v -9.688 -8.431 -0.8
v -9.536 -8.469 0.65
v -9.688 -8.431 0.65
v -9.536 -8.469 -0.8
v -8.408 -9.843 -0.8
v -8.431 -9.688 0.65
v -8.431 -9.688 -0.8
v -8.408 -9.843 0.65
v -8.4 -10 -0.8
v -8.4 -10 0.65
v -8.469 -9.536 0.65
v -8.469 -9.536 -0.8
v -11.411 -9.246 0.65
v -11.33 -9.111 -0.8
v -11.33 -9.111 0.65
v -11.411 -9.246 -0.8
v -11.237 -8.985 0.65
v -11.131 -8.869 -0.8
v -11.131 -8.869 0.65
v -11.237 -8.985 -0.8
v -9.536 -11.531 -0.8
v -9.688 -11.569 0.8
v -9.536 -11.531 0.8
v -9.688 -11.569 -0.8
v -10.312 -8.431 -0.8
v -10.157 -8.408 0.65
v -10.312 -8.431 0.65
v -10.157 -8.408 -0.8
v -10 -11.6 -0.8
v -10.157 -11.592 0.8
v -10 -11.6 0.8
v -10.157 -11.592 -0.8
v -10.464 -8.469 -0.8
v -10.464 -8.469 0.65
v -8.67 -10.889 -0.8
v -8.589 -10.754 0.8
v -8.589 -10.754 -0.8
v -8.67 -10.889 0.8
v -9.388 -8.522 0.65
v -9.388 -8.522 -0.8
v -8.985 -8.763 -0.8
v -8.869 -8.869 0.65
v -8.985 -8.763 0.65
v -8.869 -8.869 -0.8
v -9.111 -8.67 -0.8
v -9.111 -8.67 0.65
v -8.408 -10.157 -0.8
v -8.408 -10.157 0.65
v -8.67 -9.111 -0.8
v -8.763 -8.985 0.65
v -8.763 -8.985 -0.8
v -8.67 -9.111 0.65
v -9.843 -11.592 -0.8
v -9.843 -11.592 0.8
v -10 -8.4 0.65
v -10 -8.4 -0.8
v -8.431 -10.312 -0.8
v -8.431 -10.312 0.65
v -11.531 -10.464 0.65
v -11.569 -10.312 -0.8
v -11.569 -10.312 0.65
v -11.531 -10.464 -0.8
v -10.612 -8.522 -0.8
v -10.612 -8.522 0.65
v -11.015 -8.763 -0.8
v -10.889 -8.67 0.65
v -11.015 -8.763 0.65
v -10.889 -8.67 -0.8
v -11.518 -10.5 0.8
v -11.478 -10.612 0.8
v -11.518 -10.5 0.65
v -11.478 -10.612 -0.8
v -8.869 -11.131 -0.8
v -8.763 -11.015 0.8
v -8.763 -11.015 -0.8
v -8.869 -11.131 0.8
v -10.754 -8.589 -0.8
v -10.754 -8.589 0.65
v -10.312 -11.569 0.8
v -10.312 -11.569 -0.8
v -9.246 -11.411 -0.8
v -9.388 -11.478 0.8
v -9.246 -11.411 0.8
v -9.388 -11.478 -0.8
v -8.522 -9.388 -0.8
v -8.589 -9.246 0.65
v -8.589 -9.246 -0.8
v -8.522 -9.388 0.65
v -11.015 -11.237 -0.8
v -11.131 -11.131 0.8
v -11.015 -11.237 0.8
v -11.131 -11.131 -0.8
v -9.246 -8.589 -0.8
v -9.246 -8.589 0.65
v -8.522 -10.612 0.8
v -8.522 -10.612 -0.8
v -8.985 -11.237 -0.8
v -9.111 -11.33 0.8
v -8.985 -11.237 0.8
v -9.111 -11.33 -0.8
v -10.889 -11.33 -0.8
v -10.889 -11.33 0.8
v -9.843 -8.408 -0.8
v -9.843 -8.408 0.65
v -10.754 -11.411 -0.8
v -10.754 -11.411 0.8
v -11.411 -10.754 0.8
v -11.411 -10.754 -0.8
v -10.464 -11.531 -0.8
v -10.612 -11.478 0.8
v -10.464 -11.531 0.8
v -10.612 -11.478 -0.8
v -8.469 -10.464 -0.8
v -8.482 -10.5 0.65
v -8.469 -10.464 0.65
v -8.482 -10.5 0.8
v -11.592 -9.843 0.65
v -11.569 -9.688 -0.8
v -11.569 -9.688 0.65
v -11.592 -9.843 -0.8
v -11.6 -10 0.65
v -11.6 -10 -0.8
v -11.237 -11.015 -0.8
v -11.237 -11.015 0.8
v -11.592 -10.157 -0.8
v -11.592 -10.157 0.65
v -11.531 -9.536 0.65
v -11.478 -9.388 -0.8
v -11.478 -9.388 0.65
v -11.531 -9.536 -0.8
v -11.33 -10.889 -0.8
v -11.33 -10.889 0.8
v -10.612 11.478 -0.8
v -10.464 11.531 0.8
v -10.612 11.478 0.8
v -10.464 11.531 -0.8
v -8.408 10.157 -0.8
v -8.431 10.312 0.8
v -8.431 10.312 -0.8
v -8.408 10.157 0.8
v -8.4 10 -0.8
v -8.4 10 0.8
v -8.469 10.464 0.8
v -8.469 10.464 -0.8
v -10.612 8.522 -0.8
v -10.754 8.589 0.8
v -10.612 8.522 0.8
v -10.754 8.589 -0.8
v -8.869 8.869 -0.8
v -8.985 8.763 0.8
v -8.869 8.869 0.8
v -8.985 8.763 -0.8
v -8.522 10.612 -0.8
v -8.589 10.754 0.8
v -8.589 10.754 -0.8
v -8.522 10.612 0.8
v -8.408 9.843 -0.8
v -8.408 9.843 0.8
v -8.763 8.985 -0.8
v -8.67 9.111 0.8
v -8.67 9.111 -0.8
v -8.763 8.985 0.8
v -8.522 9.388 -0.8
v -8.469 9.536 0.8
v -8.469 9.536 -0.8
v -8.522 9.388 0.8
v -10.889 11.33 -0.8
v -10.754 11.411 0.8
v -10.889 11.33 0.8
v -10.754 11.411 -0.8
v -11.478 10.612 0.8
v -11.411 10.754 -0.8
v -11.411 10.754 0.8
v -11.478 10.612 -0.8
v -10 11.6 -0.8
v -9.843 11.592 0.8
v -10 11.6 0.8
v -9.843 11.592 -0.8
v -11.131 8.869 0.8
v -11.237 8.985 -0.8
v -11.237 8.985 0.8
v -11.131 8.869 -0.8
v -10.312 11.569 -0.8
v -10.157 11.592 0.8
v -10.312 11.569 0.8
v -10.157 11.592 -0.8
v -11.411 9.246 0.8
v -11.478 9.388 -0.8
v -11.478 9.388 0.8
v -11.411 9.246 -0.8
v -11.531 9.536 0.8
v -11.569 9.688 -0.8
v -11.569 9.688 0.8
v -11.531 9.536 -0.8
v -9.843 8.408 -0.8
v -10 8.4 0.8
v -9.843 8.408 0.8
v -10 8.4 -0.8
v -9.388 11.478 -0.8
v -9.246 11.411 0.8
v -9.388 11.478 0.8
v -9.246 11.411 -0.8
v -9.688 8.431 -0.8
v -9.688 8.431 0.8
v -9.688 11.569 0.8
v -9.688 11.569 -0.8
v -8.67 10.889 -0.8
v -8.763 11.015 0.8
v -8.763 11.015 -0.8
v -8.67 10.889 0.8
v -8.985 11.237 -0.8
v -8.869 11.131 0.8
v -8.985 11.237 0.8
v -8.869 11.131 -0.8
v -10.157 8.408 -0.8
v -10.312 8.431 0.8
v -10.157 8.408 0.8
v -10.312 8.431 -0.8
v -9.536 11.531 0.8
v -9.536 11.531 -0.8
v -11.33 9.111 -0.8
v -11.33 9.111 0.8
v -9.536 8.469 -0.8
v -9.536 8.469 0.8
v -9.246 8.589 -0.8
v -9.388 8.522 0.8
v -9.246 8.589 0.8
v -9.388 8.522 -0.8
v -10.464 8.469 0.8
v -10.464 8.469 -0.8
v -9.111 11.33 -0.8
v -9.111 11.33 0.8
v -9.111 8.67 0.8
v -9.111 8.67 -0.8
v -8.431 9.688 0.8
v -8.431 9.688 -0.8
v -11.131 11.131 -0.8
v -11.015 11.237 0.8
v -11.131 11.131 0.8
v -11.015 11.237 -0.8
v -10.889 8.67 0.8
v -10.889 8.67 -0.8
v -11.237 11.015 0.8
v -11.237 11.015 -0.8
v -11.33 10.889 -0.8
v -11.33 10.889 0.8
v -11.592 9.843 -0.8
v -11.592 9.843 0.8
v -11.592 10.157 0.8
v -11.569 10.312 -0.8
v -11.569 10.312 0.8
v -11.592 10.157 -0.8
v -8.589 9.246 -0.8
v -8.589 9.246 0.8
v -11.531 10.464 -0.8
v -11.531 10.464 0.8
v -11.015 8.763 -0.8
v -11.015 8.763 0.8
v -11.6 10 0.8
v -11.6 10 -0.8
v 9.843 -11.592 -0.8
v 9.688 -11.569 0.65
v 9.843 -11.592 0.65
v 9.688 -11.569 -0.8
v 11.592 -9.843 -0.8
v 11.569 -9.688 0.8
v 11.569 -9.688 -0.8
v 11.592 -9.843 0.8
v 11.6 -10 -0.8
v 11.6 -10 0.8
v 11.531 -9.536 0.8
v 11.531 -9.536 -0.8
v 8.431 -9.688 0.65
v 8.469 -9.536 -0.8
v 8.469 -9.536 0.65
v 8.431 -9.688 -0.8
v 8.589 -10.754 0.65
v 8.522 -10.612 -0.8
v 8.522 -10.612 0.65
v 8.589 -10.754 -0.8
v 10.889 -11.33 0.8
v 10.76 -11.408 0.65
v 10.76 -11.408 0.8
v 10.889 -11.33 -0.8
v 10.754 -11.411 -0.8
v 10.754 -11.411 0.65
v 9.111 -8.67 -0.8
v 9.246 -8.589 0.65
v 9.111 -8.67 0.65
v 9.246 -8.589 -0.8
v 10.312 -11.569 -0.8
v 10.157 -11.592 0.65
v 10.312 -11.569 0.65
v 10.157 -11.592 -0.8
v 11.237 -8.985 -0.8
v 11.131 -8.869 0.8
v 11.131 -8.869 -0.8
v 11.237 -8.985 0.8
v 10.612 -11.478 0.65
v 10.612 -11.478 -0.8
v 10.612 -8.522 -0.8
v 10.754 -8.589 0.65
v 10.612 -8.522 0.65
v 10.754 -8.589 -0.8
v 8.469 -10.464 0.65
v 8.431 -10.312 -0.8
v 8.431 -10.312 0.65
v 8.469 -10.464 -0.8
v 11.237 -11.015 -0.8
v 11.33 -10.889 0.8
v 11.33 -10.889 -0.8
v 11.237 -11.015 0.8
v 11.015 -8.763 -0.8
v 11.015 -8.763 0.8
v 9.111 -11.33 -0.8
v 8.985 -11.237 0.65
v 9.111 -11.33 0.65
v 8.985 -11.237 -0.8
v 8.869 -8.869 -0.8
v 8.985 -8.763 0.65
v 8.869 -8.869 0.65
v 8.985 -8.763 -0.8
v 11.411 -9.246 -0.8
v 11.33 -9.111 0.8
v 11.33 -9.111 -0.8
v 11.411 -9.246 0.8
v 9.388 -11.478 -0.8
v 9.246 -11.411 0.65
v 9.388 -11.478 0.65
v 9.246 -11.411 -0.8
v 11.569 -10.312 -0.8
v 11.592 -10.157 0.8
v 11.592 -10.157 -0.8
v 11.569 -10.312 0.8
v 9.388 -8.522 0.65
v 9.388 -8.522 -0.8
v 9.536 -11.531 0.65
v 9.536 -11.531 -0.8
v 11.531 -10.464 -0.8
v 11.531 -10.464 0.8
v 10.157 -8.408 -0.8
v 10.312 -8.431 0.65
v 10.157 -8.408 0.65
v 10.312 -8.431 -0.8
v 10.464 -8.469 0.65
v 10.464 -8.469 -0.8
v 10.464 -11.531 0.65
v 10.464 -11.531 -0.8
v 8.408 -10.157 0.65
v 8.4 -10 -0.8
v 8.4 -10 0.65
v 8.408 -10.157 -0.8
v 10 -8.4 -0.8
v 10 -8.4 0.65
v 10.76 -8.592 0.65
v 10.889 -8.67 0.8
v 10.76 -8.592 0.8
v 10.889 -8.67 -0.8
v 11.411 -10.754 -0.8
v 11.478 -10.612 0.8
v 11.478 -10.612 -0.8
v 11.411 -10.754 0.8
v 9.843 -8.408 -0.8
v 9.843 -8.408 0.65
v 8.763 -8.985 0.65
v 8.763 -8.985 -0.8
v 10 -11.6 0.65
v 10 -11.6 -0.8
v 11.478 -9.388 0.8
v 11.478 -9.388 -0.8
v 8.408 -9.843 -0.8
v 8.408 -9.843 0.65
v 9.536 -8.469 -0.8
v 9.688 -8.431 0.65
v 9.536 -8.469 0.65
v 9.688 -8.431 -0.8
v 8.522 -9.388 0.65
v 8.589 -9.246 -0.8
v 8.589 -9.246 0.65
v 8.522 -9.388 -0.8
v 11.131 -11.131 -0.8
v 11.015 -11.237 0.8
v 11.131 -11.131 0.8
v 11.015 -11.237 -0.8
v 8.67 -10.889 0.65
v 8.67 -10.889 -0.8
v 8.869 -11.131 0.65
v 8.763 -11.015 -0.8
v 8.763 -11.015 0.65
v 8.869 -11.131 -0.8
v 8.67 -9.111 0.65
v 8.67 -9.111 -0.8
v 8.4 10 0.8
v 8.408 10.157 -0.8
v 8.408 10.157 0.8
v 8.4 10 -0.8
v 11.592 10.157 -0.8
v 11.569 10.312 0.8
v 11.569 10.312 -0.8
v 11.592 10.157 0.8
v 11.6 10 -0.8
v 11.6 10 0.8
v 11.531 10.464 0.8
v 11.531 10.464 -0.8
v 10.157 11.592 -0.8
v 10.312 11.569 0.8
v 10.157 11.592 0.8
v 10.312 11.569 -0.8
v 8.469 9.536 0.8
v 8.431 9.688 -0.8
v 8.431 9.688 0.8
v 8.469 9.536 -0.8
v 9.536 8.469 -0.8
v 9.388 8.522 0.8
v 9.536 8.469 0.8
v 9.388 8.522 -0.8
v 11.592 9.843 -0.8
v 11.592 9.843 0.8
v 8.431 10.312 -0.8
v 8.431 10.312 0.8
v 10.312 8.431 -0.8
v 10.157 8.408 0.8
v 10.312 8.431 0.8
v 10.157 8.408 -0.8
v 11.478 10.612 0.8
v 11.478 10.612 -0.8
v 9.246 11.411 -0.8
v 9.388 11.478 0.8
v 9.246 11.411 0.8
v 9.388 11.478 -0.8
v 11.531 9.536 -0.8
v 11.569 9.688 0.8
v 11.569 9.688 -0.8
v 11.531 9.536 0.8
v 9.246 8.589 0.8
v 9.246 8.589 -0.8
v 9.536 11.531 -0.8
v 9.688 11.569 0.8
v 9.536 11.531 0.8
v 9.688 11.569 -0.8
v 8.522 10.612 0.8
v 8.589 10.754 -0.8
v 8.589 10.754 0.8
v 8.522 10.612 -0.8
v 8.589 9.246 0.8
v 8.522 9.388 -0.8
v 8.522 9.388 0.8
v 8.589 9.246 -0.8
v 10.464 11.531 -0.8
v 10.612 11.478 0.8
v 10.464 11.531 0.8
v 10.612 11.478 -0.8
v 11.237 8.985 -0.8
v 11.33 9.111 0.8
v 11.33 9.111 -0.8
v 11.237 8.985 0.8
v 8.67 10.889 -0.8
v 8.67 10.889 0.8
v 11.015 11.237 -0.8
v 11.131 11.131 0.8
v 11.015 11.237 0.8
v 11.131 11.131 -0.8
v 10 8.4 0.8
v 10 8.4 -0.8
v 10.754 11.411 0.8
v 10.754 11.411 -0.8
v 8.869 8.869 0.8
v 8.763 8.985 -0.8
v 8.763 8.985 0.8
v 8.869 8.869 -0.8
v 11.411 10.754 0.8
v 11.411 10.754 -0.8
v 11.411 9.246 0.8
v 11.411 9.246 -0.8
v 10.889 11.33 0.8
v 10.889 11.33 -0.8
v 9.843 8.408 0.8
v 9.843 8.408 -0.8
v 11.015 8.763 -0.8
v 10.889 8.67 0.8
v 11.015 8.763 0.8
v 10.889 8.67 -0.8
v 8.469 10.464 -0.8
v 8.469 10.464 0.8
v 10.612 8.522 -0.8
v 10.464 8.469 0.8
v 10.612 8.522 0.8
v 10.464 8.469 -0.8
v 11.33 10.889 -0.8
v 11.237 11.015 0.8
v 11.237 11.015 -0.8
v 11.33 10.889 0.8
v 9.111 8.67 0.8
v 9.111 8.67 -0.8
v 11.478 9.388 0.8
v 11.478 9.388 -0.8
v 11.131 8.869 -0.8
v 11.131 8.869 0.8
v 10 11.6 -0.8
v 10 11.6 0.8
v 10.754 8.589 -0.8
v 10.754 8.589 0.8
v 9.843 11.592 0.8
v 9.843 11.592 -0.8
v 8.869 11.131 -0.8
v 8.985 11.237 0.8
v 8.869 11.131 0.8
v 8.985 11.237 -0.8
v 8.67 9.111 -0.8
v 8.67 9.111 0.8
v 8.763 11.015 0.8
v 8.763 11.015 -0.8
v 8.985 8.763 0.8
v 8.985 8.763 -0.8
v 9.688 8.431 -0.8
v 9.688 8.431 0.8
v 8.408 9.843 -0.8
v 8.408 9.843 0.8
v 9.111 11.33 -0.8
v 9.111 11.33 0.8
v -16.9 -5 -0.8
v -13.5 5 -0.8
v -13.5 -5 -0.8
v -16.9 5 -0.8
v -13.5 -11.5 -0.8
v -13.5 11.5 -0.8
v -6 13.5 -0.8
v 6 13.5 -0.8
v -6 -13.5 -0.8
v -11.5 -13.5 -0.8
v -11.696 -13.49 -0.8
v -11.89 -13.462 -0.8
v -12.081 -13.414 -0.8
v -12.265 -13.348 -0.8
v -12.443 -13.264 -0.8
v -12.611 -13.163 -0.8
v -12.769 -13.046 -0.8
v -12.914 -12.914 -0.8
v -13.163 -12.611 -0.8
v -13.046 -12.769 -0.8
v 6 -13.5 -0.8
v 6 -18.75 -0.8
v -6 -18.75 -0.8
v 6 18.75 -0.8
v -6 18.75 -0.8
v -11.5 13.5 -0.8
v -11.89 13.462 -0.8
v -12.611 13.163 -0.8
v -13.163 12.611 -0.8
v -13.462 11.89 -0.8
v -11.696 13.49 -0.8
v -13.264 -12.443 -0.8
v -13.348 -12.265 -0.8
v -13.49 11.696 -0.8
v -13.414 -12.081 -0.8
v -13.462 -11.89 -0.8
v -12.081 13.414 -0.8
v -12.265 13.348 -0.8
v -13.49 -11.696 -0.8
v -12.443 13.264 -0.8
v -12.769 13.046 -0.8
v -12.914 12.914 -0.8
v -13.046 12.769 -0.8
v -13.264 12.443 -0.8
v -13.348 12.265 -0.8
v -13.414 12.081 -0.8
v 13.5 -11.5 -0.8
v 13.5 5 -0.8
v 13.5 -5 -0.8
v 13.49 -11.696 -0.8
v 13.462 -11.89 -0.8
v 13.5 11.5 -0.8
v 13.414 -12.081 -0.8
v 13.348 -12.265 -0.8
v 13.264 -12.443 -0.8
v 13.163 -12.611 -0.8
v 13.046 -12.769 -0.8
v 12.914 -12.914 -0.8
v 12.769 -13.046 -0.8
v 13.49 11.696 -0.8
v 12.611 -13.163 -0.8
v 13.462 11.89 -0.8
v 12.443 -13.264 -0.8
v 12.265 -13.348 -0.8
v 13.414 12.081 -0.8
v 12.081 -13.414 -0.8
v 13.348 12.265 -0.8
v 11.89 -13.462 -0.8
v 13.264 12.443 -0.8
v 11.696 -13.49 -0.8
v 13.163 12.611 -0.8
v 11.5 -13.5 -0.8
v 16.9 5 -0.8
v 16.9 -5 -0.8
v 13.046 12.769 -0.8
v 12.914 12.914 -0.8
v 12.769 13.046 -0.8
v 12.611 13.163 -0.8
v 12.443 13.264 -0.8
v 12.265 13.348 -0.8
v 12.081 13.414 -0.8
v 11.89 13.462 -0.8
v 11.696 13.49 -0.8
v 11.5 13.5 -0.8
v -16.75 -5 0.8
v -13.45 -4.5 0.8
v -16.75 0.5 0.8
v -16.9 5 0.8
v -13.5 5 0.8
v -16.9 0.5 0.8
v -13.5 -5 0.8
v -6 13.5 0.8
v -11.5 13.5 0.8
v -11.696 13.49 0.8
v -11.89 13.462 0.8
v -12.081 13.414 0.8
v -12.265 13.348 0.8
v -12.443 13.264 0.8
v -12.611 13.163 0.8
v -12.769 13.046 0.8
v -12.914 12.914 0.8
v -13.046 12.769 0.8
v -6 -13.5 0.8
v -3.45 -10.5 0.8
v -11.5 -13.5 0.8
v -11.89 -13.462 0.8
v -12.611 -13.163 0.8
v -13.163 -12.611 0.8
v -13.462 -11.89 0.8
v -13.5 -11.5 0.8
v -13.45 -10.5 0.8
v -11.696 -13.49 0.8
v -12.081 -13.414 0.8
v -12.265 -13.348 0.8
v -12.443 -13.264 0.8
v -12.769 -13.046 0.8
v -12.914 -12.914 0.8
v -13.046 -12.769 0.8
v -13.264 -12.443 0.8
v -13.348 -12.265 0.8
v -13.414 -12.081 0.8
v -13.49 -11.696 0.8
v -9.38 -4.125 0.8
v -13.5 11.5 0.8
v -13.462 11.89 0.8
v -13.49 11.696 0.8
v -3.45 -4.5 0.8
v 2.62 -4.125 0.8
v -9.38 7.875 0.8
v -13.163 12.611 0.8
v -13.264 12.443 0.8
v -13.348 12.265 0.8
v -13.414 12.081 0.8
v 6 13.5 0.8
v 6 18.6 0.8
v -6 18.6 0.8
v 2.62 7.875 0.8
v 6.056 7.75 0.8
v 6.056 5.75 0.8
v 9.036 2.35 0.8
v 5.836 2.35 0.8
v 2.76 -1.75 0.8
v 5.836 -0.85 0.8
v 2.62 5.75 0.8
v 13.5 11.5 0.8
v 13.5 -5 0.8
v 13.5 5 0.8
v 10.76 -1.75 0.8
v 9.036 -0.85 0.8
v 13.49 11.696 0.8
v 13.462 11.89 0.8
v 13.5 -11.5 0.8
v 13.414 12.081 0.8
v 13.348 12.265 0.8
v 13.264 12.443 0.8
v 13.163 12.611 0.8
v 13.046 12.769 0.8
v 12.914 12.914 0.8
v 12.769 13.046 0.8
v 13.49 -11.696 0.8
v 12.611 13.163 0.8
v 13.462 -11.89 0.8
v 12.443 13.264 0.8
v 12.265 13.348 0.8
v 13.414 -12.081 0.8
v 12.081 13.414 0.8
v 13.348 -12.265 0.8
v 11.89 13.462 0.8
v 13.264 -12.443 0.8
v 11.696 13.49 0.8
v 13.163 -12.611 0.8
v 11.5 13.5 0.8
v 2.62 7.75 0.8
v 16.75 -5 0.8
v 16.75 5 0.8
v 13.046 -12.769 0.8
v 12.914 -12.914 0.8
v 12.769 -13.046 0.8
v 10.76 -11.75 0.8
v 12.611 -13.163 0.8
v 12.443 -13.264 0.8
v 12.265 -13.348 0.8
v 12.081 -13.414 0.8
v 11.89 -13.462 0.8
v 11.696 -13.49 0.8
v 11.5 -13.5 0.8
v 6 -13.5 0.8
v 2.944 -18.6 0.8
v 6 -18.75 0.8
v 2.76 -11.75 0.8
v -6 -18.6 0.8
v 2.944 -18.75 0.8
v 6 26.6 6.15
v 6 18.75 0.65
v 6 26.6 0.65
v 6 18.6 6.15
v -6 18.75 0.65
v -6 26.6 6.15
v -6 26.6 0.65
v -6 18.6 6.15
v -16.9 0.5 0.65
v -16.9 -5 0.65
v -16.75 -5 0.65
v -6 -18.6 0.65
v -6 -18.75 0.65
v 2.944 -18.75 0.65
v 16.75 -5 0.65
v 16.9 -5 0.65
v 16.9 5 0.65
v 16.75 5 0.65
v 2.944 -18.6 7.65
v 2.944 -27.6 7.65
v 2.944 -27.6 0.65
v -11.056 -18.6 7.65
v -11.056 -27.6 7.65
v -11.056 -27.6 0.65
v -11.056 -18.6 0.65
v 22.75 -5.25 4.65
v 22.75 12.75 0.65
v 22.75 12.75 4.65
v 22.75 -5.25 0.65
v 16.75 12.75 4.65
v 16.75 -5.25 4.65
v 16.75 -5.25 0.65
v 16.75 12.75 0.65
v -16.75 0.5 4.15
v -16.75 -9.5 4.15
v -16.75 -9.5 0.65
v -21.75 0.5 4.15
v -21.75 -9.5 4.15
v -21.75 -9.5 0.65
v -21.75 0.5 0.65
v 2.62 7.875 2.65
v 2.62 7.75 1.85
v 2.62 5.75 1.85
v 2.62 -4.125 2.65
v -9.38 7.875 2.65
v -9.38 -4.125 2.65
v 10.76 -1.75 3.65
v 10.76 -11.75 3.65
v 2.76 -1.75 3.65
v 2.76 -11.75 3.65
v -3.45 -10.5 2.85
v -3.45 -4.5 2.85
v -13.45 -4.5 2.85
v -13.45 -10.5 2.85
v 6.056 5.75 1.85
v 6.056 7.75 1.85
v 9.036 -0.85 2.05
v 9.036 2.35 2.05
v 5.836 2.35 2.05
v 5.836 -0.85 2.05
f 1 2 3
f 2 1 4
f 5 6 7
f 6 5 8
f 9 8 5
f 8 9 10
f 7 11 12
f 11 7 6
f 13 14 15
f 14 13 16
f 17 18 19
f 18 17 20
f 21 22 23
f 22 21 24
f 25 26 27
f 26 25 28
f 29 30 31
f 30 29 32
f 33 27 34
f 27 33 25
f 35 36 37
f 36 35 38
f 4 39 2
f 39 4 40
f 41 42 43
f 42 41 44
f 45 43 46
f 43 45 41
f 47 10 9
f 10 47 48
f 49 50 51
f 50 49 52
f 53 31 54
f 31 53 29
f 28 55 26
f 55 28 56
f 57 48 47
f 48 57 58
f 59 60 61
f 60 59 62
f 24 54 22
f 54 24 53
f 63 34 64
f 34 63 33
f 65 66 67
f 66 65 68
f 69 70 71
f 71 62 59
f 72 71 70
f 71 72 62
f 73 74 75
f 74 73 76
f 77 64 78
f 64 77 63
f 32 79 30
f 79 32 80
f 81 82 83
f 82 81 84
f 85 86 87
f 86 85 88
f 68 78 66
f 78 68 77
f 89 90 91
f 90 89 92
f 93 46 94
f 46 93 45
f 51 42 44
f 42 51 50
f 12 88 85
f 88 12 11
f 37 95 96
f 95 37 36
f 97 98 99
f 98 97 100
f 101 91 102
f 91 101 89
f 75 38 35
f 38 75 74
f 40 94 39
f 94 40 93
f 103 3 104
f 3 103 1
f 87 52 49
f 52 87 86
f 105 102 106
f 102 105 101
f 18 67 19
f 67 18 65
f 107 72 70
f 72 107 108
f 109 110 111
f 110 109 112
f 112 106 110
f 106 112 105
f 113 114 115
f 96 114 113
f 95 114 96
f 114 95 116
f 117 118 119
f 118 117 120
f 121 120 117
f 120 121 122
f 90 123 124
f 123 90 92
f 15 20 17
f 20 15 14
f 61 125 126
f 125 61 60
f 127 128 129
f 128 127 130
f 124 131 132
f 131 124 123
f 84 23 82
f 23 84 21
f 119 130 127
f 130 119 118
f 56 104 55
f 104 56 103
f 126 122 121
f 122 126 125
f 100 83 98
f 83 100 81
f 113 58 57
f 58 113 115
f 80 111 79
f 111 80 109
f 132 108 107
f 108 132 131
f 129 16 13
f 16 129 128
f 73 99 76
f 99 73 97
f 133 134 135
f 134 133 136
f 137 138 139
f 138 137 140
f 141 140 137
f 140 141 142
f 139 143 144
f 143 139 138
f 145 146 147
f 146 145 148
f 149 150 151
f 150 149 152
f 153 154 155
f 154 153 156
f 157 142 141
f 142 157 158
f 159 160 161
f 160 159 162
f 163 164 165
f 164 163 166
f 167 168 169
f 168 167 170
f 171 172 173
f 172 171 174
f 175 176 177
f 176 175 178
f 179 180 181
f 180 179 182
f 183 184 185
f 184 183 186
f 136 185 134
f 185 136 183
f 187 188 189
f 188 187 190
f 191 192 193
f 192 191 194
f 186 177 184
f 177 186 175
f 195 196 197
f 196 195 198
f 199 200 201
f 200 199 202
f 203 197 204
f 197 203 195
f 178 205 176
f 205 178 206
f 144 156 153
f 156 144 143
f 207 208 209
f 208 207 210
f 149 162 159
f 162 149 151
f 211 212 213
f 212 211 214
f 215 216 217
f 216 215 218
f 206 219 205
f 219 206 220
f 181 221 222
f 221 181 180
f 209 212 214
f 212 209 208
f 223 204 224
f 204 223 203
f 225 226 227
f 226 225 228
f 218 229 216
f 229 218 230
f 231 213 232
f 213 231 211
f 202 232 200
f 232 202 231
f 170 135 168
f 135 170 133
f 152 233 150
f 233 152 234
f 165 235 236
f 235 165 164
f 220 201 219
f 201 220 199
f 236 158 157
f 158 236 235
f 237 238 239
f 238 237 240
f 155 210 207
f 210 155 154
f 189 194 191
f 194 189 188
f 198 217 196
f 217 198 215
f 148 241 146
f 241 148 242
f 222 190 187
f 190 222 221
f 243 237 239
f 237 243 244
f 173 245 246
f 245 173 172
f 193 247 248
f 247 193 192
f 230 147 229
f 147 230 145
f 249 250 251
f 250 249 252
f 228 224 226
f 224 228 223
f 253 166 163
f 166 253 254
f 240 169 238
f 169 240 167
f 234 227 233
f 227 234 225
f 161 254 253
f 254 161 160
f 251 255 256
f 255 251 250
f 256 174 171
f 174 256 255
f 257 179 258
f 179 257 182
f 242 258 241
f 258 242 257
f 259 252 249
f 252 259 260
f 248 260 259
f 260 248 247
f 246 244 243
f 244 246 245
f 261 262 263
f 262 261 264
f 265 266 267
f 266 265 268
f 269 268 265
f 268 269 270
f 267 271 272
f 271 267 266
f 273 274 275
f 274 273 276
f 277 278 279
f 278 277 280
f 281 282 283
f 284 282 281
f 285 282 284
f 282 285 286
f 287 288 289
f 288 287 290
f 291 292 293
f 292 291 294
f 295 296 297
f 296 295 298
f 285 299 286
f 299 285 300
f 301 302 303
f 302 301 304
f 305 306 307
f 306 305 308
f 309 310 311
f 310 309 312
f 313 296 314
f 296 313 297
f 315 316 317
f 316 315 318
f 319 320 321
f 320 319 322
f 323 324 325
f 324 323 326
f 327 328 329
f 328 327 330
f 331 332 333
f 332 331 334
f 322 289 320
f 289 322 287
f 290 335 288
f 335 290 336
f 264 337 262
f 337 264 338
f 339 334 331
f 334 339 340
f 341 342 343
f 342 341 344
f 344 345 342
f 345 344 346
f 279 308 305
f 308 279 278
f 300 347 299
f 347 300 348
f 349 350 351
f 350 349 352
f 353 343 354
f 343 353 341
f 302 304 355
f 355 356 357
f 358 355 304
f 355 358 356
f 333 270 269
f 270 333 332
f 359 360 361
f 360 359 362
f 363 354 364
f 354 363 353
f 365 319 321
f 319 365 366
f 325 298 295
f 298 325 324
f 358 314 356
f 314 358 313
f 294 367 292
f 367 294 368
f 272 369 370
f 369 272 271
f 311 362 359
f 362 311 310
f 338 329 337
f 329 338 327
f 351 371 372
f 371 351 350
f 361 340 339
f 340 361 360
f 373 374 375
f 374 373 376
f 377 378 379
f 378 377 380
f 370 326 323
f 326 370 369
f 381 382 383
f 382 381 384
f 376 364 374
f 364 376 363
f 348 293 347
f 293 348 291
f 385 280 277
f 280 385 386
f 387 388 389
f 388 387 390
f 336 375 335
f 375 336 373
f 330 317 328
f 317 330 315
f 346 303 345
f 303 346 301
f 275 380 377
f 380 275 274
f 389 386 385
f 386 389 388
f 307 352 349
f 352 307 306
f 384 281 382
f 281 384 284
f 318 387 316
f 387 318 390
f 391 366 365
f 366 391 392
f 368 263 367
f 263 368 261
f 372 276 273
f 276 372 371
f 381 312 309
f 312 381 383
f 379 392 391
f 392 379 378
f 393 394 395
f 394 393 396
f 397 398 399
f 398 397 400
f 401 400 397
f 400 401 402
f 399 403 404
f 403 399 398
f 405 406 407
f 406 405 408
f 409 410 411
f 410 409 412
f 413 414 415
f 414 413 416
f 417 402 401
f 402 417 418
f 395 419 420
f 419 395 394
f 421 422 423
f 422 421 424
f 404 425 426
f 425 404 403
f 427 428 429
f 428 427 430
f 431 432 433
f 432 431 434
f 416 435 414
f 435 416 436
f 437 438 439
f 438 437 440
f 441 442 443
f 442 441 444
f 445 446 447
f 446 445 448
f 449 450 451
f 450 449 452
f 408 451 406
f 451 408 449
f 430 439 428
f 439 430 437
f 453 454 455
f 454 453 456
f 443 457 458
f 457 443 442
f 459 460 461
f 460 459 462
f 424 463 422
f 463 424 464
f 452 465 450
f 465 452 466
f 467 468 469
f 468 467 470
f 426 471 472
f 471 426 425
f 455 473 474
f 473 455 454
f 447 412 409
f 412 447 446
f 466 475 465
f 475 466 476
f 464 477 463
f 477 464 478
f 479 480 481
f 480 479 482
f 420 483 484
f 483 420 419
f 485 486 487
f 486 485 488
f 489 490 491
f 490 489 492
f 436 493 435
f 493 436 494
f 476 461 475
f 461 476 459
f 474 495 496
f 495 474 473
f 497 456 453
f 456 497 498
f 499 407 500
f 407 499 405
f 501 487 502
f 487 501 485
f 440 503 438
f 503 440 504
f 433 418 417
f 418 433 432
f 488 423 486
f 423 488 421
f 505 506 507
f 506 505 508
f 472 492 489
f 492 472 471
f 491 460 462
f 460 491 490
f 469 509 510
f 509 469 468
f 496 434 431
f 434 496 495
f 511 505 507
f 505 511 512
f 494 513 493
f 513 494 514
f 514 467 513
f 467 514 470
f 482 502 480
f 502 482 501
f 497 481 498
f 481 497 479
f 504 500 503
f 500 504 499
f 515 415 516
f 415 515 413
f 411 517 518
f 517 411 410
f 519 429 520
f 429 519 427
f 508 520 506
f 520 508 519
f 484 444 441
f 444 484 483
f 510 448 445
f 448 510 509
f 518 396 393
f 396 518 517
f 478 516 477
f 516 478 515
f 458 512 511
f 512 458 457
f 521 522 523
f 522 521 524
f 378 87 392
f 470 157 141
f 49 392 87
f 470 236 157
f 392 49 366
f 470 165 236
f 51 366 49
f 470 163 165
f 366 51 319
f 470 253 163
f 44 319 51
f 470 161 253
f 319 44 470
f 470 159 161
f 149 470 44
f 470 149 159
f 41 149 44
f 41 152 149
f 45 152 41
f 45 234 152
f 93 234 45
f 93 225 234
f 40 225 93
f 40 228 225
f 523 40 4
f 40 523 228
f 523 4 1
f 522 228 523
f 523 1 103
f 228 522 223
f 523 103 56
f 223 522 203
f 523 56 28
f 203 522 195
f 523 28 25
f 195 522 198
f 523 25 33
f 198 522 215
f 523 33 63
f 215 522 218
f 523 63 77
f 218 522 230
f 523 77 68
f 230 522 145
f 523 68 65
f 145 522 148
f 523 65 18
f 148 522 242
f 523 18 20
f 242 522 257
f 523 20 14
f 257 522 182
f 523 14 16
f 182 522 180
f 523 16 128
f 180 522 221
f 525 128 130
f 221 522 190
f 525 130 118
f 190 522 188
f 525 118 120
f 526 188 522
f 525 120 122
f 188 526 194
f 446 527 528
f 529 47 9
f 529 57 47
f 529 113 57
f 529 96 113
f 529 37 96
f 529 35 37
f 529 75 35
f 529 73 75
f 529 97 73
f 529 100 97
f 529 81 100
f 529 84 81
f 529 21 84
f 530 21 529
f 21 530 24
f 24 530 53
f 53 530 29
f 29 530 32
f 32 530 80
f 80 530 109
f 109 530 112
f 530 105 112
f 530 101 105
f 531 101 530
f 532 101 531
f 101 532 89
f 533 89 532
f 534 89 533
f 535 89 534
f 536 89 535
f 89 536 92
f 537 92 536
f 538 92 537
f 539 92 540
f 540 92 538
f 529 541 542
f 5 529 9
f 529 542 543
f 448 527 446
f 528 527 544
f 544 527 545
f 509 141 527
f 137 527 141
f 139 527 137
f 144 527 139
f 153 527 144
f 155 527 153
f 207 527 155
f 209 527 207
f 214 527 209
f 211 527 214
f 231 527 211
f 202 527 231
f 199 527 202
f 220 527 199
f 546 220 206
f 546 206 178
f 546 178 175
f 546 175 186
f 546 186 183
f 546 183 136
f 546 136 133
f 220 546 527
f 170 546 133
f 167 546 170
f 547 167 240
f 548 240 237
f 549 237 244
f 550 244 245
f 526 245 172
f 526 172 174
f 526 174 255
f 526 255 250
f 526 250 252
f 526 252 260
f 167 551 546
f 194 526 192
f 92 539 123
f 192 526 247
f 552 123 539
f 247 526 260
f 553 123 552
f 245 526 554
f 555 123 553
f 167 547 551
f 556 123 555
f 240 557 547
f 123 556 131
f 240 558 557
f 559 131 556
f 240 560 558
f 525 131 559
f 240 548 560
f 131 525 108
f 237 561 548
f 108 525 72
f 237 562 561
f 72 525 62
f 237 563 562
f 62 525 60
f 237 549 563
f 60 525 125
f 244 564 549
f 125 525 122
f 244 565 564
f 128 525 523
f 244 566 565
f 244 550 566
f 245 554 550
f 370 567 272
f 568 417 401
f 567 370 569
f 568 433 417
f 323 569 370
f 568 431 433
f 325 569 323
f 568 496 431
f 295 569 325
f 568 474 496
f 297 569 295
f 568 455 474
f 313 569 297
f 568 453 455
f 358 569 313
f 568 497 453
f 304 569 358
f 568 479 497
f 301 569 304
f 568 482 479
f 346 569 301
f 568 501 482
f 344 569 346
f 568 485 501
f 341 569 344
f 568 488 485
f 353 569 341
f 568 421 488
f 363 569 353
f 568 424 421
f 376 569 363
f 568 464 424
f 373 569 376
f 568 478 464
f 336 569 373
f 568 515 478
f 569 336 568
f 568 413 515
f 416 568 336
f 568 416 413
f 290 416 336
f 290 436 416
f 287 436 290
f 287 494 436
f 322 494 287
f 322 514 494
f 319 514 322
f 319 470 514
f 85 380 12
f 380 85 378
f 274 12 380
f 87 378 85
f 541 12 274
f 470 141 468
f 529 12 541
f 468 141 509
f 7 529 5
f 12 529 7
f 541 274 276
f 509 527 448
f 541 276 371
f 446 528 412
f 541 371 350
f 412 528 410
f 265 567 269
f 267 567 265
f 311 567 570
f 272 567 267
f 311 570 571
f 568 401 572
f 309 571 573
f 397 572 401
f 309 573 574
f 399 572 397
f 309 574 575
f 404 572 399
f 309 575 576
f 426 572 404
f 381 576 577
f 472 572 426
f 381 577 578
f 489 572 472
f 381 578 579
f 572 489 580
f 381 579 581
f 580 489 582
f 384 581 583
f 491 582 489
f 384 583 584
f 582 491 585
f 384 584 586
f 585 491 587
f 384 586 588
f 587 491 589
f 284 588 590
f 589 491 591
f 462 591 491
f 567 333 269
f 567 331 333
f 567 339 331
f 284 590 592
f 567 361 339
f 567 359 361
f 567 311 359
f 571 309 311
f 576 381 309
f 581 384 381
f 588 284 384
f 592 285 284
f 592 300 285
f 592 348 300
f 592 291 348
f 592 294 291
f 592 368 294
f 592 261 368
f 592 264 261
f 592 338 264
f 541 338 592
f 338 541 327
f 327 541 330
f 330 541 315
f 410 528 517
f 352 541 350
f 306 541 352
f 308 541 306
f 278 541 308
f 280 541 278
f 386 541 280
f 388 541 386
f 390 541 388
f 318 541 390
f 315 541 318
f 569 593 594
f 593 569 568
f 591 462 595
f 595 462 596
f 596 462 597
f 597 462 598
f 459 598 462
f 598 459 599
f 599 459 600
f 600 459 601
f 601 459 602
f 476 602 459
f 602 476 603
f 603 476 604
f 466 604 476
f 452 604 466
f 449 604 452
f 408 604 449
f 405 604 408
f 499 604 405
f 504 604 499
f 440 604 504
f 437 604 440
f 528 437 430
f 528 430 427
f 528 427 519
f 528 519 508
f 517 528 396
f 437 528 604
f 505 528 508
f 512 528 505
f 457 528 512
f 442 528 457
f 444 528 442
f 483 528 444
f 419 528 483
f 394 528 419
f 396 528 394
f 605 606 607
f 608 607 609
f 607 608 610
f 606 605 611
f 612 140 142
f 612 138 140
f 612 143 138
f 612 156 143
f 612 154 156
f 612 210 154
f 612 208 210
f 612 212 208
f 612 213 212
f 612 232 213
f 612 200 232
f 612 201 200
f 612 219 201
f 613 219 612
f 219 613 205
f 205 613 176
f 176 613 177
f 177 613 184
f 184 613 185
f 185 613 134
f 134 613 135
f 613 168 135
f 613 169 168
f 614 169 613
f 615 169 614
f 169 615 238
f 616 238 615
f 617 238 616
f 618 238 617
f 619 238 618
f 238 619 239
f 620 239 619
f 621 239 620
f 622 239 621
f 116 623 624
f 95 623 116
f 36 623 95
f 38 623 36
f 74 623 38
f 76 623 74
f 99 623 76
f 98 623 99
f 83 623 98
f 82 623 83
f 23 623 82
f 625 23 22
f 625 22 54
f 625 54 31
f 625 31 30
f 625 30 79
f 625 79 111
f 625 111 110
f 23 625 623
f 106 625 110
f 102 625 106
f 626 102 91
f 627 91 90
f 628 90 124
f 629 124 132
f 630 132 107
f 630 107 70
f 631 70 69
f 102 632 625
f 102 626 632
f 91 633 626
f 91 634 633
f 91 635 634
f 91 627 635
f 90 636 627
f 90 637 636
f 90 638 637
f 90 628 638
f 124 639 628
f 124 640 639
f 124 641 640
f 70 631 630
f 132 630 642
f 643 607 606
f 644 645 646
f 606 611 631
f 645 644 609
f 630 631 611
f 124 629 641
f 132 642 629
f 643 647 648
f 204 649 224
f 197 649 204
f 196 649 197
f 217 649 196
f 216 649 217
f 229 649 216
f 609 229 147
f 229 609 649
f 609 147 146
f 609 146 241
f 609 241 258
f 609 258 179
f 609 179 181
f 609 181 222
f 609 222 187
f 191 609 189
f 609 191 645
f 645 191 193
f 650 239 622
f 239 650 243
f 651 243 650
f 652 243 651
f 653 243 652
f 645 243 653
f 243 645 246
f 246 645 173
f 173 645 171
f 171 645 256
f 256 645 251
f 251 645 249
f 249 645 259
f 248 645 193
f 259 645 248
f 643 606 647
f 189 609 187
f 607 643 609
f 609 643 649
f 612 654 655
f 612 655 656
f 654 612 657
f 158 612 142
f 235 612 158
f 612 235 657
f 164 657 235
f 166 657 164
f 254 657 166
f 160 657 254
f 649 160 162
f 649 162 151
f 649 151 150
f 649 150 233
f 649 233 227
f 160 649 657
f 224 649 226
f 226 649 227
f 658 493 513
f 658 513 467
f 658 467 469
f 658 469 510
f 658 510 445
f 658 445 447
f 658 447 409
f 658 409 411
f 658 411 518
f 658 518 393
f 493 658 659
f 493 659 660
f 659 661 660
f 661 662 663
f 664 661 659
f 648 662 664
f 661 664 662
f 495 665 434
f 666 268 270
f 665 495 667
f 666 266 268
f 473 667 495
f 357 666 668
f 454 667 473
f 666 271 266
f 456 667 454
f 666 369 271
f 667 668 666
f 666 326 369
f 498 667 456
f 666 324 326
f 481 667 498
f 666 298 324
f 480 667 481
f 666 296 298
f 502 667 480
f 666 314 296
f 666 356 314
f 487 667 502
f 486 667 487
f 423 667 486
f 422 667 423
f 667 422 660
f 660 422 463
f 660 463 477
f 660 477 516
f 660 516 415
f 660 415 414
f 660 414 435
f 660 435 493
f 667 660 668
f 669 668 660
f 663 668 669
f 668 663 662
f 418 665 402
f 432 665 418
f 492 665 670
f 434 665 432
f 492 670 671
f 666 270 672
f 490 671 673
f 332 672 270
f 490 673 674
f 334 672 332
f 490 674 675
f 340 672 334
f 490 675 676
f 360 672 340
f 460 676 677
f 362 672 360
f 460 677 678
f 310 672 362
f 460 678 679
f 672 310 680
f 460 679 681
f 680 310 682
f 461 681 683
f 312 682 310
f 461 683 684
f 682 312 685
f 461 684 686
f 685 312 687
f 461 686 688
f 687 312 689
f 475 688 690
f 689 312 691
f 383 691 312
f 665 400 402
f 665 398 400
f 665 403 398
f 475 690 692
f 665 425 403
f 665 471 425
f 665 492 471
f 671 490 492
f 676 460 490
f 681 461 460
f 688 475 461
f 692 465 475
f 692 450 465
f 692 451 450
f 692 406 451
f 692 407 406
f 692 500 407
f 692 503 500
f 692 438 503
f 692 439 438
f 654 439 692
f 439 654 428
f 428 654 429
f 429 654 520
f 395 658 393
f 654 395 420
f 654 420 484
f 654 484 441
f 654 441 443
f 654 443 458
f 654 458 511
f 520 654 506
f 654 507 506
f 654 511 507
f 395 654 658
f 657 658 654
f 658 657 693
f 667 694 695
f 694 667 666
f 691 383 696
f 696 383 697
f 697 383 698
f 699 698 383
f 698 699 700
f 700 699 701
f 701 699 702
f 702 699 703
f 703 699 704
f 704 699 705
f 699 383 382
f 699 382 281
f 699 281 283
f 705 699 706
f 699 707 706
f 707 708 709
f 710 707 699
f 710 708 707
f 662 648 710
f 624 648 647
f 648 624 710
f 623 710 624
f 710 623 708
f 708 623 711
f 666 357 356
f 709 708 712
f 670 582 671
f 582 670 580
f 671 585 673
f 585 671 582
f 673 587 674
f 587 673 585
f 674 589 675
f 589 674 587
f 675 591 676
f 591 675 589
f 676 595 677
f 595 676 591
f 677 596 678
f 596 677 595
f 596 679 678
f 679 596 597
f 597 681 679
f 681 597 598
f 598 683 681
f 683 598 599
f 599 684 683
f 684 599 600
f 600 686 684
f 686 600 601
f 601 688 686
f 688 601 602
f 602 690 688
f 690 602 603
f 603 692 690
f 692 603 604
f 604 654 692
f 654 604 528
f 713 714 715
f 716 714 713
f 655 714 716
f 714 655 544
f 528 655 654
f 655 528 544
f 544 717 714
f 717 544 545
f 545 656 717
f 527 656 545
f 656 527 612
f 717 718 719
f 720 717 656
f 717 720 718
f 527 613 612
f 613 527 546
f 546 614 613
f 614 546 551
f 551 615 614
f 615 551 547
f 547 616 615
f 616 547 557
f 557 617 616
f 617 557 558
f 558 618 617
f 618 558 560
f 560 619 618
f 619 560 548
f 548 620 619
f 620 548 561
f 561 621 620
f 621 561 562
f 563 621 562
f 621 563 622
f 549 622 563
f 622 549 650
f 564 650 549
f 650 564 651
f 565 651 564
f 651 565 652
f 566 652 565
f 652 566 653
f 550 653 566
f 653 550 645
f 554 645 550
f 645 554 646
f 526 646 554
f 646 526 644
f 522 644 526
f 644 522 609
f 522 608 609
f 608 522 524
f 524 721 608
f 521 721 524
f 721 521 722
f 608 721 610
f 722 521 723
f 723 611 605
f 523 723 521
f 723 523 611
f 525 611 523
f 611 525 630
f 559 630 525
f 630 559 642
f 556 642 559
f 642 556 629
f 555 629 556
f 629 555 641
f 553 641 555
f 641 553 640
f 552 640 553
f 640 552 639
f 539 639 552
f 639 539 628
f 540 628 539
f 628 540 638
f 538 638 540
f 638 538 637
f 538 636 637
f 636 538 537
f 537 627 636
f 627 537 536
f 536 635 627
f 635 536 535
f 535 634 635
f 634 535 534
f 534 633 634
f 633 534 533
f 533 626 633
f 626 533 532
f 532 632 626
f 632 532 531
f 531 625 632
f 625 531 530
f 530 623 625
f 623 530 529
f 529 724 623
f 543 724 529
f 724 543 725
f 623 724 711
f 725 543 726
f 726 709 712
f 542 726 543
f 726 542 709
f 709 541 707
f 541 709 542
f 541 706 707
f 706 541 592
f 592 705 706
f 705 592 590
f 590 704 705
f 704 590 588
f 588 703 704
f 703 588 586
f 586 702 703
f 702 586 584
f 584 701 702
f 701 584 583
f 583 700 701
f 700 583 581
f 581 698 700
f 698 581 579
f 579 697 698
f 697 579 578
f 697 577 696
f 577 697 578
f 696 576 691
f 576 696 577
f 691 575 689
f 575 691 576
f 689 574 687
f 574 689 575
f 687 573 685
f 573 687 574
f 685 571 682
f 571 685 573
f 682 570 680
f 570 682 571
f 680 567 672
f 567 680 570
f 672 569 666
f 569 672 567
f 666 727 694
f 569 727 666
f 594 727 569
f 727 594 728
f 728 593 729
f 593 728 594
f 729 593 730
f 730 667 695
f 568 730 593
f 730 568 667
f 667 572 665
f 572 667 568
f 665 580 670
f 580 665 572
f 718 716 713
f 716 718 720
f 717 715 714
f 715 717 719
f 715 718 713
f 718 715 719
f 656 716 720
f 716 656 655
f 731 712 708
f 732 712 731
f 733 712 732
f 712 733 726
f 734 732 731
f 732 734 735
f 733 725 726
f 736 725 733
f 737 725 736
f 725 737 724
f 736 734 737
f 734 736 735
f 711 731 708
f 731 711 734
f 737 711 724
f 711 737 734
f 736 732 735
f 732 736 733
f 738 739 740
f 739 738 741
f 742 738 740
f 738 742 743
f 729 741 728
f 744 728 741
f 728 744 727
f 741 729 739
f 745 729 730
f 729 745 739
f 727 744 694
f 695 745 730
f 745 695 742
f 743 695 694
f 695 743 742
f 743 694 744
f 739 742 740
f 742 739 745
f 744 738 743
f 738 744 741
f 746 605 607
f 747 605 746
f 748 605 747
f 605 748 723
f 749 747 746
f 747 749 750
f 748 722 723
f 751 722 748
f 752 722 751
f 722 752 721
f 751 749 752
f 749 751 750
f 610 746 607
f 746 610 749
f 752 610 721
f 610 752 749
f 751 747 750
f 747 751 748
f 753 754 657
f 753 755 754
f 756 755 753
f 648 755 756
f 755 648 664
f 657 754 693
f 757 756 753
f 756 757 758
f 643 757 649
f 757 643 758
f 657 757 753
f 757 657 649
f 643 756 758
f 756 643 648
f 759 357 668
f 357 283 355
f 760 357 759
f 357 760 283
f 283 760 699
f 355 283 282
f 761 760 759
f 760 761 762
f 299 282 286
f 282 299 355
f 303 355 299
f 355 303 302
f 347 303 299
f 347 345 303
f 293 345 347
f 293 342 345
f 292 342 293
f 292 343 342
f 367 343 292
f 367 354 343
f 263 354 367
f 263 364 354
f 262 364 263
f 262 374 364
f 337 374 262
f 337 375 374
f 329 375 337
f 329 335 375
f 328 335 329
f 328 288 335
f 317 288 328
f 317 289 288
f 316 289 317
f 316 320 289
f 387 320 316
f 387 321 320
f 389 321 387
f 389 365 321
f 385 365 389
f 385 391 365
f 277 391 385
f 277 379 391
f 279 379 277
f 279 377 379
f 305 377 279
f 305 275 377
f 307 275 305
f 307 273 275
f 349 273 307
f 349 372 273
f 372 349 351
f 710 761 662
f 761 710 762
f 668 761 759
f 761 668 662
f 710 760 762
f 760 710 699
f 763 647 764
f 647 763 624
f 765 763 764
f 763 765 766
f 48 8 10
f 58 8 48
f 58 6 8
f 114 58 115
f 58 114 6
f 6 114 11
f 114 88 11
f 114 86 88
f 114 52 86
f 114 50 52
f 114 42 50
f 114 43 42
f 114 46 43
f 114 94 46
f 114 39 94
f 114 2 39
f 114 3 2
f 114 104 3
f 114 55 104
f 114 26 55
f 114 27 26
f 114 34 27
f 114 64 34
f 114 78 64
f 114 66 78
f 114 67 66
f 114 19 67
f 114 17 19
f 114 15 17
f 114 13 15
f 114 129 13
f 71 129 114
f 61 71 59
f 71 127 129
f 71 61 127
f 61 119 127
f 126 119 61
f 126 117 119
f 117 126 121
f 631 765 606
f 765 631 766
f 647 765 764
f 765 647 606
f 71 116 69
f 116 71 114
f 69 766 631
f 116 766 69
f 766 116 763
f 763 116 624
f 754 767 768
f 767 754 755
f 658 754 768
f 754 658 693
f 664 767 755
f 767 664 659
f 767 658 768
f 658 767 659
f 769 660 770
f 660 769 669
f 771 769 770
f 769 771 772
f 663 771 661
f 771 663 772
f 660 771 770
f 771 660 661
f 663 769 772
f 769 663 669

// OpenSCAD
$fn = 64;

// Target PCB overall envelope (mm)
pcb_x = 33.8;   // X overall
pcb_y = 37.5;   // Y overall
pcb_z = 1.6;    // thickness

// Outline styling
corner_r = 2.0;

// Mounting holes
hole_d = 3.2;
hole_edge_margin = 3.5;

// Connectivity / robustness
eps = 0.15;     // overlap to guarantee one connected solid

// --- Outline tabs (kept within overall pcb_x/pcb_y) ---
// Central rounded rectangle size (tabs extend to reach overall size)
core_x = 27.0;
core_y = 27.0;

// Tabs on +Y and -Y (top/bottom)
tab_y_w = 12.0;
tab_y_len = (pcb_y - core_y)/2;   // each tab length in Y

// Tabs on +X and -X (right/left)
tab_x_h = 10.0;
tab_x_len = (pcb_x - core_x)/2;   // each tab length in X

// --- Simple component placeholders (all connected to PCB) ---
usb_w = 12.0;  usb_d = 8.0;  usb_h = 5.5;
term_w = 14.0; term_d = 9.0; term_h = 7.0;
header_w = 18.0; header_d = 6.0; header_h = 4.0;

chip_w = 12.0; chip_d = 12.0; chip_h = 2.0;
reg_w  = 8.0;  reg_d  = 10.0; reg_h  = 3.0;

// ---------- Helpers ----------
module rounded_rect_2d(w, l, r) {
    hull() {
        for (sx = [-1, 1], sy = [-1, 1])
            translate([sx*(w/2 - r), sy*(l/2 - r)]) circle(r=r);
    }
}

module pcb_outline_2d() {
    union() {
        // Core
        rounded_rect_2d(core_x, core_y, corner_r);

        // +Y tab (top)
        translate([0, core_y/2 + tab_y_len/2])
            square([tab_y_w, tab_y_len], center=true);

        // -Y tab (bottom)
        translate([0, -(core_y/2 + tab_y_len/2)])
            square([tab_y_w, tab_y_len], center=true);

        // +X tab (right)
        translate([core_x/2 + tab_x_len/2, 0])
            square([tab_x_len, tab_x_h], center=true);

        // -X tab (left)
        translate([-(core_x/2 + tab_x_len/2), 0])
            square([tab_x_len, tab_x_h], center=true);
    }
}

module pcb_solid() {
    difference() {
        linear_extrude(height=pcb_z, center=true)
            pcb_outline_2d();

        // Mounting holes (through)
        for (sx = [-1, 1], sy = [-1, 1])
            translate([sx*(core_x/2 - hole_edge_margin),
                       sy*(core_y/2 - hole_edge_margin),
                       0])
                cylinder(h=pcb_z + 2, r=hole_d/2, center=true);
    }
}

module top_feature(size_xyz, pos_xy) {
    translate([pos_xy[0], pos_xy[1], pcb_z/2 + size_xyz[2]/2 - eps])
        cube(size_xyz, center=true);
}

module side_feature_y(size_xyz, side, x_off=0) {
    translate([x_off,
               side*(pcb_y/2 + size_xyz[1]/2 - eps),
               pcb_z/2 + size_xyz[2]/2 - eps])
        cube(size_xyz, center=true);
}

module side_feature_x(size_xyz, side, y_off=0) {
    translate([side*(pcb_x/2 + size_xyz[0]/2 - eps),
               y_off,
               pcb_z/2 + size_xyz[2]/2 - eps])
        cube(size_xyz, center=true);
}

// ---------- Complete connected model ----------
union() {
    // PCB base with correct overall 33.8 x 37.5 x 1.6
    pcb_solid();

    // Edge connectors (connected, not floating)
    // USB-like connector on +Y edge, centered
    side_feature_y([usb_w, usb_d, usb_h], +1, 0);

    // Terminal block on -Y edge, slightly offset
    side_feature_y([term_w, term_d, term_h], -1, -pcb_x*0.12);

    // Side header on +X edge, slightly offset in Y
    side_feature_x([header_d, header_w, header_h], +1, pcb_y*0.10);

    // Additional small connector on -X edge to add realism
    side_feature_x([5.0, 10.0, 3.5], -1, -pcb_y*0.12);

    // Components on top surface (simple outlines)
    top_feature([chip_w, chip_d, chip_h], [ -pcb_x*0.10,  pcb_y*0.05 ]);
    top_feature([reg_w,  reg_d,  reg_h ], [  pcb_x*0.20, -pcb_y*0.18 ]);
    top_feature([10, 6, 2.2],              [ -pcb_x*0.25, -pcb_y*0.20 ]);

    // A couple of small passives for board detail
    top_feature([4.0, 2.0, 1.2], [ pcb_x*0.05,  pcb_y*0.18 ]);
    top_feature([4.0, 2.0, 1.2], [ pcb_x*0.12,  pcb_y*0.18 ]);
    top_feature([3.2, 3.2, 1.4], [ pcb_x*0.22,  pcb_y*0.02 ]);
}
